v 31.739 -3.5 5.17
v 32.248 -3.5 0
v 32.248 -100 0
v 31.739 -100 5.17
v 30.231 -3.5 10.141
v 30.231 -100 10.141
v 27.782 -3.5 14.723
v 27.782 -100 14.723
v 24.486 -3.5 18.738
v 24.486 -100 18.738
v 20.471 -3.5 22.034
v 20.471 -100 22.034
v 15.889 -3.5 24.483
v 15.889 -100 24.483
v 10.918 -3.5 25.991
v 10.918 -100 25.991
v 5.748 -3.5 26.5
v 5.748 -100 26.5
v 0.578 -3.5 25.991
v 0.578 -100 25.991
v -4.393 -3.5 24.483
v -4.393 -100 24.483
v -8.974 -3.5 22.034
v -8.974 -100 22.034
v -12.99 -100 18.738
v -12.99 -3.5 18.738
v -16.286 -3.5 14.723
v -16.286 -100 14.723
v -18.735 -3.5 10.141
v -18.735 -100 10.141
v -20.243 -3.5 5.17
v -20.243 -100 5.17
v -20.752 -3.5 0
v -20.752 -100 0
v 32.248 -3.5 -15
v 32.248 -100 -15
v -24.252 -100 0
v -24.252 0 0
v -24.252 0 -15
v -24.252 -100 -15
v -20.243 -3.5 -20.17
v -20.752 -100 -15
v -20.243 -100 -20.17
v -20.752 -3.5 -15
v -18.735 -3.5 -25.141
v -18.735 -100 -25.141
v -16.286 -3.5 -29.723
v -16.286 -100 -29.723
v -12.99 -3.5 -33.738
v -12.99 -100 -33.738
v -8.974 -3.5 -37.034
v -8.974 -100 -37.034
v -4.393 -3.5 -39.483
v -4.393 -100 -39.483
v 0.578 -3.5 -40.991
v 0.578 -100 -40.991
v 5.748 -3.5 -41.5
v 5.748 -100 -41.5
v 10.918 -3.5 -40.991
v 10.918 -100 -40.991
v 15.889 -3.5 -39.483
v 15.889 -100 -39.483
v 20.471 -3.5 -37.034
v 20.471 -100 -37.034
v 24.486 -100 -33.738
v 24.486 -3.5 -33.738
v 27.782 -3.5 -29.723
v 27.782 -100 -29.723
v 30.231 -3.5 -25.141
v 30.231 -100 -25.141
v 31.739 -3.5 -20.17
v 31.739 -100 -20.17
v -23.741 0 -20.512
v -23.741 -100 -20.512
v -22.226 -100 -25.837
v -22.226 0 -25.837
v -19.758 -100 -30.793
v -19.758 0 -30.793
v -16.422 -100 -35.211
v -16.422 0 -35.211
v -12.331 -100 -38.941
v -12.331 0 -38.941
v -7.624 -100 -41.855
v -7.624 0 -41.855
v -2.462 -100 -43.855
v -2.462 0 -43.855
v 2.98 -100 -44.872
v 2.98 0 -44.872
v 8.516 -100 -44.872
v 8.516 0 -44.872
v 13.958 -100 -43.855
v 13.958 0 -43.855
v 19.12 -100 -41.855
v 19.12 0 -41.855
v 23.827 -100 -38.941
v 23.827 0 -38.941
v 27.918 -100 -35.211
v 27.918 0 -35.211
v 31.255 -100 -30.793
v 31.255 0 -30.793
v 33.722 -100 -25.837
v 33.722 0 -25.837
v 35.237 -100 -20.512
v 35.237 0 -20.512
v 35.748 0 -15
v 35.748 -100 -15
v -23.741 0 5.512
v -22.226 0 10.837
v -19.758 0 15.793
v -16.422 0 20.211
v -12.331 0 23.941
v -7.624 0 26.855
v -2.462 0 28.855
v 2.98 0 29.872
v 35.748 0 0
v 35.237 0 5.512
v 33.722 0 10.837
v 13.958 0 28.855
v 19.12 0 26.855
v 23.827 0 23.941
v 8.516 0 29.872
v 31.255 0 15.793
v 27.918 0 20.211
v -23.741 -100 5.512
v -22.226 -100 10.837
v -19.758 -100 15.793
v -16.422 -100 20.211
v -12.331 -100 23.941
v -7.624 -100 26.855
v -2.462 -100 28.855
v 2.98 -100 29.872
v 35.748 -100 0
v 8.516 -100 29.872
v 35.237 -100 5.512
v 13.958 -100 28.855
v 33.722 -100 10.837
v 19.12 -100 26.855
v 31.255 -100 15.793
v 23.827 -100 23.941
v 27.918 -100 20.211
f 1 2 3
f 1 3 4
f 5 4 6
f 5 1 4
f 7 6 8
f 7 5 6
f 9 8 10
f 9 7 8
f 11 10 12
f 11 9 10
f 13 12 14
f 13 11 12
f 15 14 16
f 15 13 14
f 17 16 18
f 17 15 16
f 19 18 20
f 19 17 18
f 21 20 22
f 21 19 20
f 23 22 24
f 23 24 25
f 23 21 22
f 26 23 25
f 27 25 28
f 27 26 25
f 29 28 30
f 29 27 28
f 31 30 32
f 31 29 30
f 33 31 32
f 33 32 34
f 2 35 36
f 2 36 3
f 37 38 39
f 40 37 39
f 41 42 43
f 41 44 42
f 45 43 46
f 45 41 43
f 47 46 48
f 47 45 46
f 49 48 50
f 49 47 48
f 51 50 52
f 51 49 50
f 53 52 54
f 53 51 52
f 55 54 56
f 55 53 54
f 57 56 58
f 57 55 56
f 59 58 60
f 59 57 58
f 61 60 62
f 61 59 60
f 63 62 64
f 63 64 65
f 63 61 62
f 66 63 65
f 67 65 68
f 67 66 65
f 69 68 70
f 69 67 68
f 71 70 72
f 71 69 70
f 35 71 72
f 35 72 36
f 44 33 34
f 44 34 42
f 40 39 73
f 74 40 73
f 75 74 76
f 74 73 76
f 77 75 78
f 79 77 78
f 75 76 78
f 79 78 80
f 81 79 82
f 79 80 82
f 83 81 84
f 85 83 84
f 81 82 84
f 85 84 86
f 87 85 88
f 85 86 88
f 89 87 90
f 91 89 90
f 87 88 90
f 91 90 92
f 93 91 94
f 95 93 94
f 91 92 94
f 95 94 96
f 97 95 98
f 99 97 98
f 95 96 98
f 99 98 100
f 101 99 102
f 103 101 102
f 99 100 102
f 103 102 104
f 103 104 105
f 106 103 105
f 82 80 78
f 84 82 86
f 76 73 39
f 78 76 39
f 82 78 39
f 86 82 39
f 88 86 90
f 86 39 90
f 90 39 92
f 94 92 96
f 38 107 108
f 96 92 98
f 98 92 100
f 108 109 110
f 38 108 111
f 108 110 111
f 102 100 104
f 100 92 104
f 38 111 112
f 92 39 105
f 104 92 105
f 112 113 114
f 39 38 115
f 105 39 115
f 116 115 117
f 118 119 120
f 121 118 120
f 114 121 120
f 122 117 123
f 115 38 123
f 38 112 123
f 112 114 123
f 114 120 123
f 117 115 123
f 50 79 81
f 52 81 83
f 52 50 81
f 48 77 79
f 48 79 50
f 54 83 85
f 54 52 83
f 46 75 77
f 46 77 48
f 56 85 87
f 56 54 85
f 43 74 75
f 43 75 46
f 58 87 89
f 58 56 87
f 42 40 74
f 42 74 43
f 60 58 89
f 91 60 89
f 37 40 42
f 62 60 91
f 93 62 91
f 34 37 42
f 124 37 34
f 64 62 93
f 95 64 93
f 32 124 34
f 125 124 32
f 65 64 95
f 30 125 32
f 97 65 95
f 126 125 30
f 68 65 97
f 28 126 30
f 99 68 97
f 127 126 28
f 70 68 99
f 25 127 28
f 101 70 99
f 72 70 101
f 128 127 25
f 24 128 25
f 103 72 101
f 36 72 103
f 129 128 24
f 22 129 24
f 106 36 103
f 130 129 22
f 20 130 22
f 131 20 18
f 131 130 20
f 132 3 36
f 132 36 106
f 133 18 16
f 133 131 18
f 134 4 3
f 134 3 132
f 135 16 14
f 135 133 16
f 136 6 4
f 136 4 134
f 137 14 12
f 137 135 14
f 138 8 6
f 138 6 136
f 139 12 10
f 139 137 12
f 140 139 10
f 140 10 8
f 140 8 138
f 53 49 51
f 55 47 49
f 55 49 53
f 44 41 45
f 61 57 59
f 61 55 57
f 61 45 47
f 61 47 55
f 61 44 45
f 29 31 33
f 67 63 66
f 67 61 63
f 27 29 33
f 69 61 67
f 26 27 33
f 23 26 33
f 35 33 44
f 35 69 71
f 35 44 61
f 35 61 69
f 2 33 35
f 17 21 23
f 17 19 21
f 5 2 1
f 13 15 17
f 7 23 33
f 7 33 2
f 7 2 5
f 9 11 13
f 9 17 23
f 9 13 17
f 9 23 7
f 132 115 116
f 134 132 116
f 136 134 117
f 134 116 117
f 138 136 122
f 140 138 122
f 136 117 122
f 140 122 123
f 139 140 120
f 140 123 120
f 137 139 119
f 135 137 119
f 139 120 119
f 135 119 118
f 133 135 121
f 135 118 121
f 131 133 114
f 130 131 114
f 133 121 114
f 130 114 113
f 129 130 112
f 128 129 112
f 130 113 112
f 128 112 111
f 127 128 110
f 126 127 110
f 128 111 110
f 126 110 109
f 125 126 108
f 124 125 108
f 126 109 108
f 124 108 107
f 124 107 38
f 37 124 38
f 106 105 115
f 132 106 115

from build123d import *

# Parameters (mm, degrees)
F1_DEPTH = 100
F2_T     = -3.5


with BuildPart() as f1:
    # F0 (on Front) → F1 (new body)
    with BuildSketch(Plane.XZ):
        with BuildLine():
            Line((35.748127, -15), (35.748127, 0))
            ThreePointArc((35.748127, 0), (5.748127, 30), (-24.251873, 0))
            Line((-24.251873, 0), (-24.251873, -15))
            ThreePointArc((-24.251873, -15), (5.748127, -45), (35.748127, -15))
        make_face()
    extrude(amount=F1_DEPTH)

    # F2
    f2_openings = [f1.faces().sort_by_distance(p)[0] for p in [
        (5.748127, -100, -7.5),
    ]]
    offset(amount=F2_T, openings=f2_openings)


solid = f1.part
